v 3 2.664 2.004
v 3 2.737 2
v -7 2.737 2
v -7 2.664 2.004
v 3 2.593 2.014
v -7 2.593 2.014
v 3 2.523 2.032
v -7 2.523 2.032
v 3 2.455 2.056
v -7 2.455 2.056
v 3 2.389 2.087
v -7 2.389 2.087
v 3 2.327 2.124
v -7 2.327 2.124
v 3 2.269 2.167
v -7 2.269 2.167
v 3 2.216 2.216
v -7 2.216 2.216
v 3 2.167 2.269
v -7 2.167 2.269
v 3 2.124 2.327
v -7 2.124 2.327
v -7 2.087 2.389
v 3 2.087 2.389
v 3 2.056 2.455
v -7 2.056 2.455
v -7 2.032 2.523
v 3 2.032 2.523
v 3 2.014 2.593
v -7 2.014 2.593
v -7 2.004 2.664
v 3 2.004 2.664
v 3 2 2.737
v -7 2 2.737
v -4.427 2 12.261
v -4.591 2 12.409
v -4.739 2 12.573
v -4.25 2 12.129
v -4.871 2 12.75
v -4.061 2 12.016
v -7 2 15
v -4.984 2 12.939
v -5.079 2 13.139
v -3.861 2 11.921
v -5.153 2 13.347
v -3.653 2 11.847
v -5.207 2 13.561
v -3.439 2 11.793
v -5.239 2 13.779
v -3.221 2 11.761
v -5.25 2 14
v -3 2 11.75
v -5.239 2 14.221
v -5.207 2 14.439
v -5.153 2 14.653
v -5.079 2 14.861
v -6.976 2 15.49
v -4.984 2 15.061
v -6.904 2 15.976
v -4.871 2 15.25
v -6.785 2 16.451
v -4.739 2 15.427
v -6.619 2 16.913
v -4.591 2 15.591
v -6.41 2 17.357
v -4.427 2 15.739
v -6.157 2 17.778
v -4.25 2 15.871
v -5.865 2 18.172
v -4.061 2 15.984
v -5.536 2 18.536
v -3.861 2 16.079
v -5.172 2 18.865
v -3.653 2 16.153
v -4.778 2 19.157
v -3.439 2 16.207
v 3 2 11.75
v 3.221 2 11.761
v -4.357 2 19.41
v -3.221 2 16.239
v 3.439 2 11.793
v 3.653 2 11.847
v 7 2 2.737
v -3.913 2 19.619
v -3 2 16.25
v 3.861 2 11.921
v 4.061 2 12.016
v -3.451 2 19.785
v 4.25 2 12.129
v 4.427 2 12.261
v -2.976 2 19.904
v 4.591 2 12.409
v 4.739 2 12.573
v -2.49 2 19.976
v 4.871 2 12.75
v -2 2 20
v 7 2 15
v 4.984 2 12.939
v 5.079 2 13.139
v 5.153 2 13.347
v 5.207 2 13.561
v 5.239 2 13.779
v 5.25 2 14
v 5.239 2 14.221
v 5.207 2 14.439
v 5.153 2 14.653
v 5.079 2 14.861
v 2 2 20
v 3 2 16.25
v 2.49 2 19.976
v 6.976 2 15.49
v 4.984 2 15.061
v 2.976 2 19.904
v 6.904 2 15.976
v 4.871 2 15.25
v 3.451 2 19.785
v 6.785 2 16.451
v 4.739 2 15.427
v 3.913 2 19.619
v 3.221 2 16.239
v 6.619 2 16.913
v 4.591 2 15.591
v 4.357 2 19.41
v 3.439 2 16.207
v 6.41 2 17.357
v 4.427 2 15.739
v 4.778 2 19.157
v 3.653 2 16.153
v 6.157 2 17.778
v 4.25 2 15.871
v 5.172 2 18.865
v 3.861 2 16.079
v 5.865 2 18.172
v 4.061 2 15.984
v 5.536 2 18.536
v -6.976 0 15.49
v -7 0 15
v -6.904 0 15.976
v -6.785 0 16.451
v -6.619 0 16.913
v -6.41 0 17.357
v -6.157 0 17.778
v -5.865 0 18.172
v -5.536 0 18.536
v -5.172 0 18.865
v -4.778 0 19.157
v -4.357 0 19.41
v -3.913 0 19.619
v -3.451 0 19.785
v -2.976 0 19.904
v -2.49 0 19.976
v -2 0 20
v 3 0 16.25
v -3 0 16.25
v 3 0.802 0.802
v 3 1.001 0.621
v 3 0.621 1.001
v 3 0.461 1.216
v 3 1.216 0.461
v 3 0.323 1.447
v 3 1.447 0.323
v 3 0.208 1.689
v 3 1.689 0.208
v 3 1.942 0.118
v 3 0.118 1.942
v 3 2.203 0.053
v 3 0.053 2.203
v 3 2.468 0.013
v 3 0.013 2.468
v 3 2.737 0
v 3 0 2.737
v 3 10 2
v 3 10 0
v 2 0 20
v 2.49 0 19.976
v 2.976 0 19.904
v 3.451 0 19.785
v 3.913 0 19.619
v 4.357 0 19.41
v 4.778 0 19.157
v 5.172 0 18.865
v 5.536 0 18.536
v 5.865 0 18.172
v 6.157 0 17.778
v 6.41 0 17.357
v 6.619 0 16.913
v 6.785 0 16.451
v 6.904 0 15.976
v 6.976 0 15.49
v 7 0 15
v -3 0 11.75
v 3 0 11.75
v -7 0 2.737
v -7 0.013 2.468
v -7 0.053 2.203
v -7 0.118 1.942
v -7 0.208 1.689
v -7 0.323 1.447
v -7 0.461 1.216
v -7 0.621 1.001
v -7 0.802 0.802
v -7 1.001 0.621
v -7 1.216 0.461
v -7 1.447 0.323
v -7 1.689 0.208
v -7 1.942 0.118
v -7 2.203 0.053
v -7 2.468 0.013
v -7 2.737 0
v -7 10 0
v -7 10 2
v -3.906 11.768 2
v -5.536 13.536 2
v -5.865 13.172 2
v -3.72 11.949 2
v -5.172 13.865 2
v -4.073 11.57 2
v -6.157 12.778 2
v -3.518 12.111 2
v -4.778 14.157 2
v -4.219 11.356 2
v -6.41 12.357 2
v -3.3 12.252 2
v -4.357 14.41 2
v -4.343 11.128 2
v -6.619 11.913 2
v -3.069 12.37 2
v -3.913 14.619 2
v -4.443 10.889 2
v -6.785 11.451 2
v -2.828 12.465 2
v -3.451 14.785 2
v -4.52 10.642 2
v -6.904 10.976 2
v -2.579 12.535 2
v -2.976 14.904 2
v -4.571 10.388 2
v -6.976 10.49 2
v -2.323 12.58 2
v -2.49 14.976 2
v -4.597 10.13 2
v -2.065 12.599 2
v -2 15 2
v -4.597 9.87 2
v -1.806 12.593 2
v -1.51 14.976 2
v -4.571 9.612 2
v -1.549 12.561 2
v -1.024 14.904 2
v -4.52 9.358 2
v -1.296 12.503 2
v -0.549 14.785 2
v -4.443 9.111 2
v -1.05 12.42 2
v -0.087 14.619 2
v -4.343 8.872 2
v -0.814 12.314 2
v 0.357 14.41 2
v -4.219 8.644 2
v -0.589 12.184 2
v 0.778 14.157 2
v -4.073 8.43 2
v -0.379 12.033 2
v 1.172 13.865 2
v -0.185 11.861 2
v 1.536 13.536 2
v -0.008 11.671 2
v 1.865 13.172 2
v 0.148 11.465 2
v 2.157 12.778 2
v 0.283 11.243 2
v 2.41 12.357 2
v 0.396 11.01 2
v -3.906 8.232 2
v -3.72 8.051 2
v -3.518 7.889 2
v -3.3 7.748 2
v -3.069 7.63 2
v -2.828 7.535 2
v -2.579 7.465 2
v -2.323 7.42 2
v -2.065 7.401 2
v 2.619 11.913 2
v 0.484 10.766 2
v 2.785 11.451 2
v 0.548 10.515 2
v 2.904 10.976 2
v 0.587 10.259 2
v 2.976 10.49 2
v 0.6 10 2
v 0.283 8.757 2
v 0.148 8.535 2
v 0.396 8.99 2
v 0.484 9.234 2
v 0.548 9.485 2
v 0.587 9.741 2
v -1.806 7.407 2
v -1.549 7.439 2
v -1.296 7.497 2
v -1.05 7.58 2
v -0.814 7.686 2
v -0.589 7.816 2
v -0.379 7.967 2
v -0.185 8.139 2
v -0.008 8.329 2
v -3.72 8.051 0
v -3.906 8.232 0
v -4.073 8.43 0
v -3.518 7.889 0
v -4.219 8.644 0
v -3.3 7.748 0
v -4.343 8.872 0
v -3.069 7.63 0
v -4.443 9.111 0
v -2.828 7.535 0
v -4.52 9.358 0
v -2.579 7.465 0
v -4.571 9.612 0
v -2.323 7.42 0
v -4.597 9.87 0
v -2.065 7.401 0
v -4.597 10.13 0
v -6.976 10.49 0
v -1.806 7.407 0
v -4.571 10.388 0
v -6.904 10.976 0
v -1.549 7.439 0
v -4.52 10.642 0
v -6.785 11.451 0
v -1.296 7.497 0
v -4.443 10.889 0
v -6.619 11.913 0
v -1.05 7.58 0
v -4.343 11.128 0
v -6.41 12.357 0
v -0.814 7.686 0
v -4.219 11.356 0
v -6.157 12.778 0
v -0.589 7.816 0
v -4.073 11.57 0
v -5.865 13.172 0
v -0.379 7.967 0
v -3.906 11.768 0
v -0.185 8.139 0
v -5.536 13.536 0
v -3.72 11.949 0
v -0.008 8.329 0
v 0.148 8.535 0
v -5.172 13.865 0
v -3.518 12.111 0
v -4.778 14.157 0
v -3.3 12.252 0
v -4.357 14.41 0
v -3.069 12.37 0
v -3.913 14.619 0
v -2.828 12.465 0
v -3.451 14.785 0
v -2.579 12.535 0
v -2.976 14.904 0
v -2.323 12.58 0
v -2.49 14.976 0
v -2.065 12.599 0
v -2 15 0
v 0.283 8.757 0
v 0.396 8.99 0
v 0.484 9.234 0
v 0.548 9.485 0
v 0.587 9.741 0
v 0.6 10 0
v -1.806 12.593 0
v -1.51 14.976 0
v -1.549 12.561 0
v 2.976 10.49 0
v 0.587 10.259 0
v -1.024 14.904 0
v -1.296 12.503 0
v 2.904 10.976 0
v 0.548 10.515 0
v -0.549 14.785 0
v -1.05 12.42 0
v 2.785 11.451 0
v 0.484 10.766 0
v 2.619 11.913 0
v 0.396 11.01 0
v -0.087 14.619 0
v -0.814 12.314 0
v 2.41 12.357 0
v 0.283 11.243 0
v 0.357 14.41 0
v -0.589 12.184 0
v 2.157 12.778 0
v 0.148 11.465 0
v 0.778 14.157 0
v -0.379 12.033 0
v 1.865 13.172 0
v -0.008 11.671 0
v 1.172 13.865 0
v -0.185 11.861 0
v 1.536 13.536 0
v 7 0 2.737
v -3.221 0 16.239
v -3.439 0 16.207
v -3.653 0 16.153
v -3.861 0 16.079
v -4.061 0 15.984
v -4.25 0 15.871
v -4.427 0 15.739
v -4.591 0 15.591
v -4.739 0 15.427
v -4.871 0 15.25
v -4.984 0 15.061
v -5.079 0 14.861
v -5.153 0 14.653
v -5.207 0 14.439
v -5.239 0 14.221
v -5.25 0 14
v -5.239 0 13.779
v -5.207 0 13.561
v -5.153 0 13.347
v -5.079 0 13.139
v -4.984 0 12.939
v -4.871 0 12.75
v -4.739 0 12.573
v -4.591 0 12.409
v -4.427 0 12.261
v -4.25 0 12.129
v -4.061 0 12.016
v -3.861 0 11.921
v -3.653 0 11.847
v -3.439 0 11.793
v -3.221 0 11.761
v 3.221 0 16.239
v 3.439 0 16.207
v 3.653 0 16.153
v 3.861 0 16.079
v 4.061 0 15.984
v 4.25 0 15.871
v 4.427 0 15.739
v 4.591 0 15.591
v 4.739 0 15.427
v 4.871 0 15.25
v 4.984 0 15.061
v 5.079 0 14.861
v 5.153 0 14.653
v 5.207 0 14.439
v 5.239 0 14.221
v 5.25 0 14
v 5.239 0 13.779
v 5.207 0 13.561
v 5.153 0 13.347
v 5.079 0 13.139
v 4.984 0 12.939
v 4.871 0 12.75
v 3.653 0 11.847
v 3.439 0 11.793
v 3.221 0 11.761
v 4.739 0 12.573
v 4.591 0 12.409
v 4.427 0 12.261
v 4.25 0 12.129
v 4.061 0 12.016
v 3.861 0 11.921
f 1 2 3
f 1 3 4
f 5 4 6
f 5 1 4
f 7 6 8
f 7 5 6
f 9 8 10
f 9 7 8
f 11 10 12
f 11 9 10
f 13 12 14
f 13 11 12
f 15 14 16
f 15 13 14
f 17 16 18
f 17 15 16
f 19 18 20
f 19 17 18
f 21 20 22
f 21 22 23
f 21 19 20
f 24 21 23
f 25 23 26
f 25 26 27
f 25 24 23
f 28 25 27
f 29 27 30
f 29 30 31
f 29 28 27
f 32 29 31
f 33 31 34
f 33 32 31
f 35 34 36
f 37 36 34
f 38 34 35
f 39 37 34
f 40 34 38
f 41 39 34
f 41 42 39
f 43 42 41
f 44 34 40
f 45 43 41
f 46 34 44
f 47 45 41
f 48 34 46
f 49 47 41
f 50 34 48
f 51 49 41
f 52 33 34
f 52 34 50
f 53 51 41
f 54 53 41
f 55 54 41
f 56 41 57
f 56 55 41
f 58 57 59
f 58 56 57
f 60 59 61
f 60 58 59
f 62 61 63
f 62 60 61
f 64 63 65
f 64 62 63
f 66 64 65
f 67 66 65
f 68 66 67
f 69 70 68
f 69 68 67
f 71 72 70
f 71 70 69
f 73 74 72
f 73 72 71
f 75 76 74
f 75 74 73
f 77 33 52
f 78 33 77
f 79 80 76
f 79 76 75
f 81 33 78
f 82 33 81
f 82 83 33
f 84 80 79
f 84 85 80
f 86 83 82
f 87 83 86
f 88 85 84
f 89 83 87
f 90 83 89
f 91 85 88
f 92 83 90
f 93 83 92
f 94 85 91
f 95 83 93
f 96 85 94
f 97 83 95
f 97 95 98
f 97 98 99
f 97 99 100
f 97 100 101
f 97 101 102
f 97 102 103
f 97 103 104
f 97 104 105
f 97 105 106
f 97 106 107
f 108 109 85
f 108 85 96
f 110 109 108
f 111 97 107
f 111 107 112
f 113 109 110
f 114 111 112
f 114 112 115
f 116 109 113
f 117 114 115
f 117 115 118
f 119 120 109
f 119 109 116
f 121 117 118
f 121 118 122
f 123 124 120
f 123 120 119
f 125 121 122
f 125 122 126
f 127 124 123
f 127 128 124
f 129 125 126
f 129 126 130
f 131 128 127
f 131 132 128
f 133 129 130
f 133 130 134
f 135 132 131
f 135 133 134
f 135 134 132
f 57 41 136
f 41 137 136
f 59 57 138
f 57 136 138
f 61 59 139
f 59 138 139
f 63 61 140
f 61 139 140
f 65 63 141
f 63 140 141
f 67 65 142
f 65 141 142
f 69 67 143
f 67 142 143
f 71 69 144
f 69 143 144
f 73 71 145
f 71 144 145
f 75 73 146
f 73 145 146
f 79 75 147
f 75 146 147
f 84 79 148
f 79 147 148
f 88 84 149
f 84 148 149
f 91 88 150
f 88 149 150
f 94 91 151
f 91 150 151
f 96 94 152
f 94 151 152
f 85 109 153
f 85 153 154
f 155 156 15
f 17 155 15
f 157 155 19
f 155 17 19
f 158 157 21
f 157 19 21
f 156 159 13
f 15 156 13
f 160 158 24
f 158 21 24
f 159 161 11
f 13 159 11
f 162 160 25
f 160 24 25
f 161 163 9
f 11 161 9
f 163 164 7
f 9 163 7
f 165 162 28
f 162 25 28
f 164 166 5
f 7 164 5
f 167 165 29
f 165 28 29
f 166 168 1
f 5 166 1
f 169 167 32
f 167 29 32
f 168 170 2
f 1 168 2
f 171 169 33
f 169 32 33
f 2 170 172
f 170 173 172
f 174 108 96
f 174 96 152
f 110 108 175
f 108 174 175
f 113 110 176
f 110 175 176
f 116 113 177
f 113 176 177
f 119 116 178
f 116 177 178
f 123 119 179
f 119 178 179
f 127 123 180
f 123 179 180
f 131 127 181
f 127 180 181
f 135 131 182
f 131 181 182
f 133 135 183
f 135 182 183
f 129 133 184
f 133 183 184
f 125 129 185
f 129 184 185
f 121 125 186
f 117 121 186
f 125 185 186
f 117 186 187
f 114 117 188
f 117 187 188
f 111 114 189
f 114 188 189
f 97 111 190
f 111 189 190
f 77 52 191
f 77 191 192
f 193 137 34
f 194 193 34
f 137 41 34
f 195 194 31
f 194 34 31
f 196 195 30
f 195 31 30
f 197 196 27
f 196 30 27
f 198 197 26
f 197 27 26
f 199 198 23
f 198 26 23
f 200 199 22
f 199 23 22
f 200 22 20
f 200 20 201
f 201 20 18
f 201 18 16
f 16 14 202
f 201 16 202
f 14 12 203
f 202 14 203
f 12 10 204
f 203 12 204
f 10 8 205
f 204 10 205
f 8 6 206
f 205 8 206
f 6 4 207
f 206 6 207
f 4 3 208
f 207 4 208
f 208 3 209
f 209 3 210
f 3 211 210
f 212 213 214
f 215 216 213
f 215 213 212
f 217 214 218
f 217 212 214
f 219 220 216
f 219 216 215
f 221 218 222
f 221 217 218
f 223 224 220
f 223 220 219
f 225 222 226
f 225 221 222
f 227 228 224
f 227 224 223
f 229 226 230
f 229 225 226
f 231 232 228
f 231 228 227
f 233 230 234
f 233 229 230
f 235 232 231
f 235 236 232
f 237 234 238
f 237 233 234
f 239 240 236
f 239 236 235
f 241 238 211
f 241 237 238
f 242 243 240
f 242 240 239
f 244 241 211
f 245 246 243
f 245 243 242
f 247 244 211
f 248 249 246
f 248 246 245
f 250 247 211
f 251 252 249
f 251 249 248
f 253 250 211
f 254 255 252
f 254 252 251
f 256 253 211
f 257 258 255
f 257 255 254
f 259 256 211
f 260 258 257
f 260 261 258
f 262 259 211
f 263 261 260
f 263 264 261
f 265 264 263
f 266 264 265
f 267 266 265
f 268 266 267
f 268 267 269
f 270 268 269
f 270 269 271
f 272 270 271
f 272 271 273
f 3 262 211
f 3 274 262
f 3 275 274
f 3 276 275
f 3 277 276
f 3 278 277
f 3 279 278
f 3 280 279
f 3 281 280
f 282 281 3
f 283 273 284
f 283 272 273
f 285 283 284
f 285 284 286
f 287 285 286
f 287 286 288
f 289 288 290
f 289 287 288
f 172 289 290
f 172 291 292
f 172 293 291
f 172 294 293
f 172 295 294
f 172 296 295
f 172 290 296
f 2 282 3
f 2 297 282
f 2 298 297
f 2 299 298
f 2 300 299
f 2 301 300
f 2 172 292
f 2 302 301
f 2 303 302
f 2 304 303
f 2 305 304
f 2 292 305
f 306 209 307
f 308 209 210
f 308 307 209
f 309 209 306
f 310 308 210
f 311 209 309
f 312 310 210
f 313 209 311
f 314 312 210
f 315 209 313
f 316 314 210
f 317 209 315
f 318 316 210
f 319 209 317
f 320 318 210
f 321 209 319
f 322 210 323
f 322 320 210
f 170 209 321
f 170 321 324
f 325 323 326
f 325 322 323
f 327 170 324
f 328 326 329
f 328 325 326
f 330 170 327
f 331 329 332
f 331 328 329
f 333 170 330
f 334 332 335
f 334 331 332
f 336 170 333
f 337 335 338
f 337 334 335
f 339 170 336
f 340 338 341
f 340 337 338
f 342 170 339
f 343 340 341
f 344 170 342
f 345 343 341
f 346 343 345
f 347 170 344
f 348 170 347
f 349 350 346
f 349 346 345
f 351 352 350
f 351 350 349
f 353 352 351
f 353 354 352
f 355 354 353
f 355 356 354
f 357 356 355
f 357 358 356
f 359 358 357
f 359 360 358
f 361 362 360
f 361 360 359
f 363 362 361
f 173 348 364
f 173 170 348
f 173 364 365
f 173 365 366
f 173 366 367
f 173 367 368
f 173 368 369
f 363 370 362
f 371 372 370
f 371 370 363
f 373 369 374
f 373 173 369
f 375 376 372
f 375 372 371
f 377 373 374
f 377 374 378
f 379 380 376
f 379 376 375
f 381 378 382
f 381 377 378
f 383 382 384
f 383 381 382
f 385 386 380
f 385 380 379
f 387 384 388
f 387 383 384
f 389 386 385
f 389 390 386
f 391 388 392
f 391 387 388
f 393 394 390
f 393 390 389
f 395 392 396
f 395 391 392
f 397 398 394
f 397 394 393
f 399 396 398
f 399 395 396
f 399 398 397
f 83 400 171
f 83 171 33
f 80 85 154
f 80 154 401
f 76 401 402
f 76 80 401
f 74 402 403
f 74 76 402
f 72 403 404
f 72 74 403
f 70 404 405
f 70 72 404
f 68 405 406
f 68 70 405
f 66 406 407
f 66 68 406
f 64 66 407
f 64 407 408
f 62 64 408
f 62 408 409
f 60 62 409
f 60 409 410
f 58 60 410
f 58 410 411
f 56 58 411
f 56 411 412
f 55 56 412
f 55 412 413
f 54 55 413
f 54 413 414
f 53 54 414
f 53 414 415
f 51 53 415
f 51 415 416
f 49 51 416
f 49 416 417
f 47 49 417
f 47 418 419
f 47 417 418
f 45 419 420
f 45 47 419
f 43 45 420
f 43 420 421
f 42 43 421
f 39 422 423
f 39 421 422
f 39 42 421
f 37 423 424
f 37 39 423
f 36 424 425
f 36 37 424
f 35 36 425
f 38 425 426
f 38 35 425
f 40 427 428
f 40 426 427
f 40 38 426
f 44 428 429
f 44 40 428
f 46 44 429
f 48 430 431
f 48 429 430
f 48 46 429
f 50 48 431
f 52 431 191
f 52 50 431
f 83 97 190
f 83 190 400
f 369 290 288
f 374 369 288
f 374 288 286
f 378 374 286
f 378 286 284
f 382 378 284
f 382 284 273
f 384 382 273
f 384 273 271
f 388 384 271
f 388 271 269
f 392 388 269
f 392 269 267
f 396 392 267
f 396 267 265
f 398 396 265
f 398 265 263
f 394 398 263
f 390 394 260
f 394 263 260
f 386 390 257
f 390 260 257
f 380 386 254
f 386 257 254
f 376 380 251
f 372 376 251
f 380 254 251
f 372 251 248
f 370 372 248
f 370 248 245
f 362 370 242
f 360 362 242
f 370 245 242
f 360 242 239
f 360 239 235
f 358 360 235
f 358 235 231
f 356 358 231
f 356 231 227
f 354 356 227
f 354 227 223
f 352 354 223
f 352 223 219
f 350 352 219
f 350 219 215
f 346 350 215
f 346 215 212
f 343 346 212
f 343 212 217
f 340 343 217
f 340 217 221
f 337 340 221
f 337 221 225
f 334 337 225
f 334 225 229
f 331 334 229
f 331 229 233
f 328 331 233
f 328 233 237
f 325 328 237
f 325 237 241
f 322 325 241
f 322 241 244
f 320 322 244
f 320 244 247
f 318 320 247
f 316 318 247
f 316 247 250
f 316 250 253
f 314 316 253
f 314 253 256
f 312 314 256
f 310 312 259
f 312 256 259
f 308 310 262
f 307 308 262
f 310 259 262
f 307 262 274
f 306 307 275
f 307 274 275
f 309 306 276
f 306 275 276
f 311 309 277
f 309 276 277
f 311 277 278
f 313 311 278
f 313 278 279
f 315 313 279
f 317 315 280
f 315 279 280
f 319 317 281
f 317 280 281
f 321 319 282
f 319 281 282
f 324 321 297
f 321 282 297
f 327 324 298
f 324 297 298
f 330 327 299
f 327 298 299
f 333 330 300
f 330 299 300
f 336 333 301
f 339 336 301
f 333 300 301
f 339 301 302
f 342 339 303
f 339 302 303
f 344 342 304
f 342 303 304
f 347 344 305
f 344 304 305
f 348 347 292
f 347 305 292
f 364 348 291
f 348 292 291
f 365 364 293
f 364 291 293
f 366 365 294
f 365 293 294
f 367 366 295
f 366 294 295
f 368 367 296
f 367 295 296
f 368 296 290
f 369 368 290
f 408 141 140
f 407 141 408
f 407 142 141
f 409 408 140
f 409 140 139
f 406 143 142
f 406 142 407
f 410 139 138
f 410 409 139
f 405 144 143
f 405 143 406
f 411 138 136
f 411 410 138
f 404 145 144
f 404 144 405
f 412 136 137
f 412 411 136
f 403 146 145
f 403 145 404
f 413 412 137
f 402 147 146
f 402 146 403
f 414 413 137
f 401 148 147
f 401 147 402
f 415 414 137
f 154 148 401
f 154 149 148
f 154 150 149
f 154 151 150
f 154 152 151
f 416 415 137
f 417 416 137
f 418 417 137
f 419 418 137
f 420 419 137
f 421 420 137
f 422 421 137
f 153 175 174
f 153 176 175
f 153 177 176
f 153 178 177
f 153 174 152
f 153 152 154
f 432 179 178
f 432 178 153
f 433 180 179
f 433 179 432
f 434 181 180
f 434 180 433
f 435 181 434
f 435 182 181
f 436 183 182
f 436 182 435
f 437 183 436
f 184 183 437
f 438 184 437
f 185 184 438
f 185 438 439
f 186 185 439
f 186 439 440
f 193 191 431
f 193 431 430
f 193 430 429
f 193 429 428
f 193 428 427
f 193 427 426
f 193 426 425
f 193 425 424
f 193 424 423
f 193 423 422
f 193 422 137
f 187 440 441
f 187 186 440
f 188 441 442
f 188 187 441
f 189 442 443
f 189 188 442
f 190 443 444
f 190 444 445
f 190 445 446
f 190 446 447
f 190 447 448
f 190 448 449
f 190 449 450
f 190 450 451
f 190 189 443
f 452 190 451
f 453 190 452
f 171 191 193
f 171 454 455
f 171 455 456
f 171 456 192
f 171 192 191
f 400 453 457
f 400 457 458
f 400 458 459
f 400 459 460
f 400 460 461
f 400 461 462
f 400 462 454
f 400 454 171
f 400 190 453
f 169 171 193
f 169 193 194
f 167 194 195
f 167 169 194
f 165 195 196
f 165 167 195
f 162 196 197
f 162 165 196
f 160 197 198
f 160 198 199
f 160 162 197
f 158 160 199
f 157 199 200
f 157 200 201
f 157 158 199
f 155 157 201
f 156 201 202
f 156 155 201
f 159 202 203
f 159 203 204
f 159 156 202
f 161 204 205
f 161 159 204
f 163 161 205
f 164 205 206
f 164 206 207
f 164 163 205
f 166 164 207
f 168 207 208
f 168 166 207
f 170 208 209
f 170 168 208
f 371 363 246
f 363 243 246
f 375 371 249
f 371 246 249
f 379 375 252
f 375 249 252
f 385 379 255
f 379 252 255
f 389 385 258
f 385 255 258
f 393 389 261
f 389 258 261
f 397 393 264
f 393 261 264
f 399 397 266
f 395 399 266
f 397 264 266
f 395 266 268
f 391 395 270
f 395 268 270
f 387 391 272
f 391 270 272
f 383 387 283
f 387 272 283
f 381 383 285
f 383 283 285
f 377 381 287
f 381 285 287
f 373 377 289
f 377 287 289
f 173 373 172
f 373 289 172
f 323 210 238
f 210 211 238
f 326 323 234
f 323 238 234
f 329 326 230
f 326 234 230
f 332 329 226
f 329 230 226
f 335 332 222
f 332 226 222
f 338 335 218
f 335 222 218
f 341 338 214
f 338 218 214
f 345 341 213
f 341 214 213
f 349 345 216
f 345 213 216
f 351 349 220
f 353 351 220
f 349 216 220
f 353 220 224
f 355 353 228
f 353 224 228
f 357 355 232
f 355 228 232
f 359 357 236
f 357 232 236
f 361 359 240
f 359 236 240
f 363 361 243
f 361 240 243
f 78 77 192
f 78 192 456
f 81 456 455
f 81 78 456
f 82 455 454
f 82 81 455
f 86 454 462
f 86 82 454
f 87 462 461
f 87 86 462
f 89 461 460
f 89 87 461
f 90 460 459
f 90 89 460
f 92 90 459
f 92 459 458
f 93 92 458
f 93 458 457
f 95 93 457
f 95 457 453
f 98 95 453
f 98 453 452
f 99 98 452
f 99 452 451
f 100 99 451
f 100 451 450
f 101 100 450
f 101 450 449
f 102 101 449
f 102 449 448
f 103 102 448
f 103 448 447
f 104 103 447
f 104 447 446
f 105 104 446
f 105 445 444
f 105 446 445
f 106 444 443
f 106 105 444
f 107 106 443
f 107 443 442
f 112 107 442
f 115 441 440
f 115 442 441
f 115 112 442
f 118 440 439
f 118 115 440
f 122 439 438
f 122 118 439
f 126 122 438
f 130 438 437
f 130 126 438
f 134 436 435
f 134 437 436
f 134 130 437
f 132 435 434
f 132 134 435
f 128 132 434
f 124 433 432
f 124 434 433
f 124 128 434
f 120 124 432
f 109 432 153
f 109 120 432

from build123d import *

# Parameters (mm, degrees)
SM_BASE_FLANGE_1_DEPTH = 7
CUT_EXTRUDE_1_DEPTH    = 25.859605789
SKETCH_4_W             = 2.7366
SKETCH_4_H             = 15
CUT_EXTRUDE_2_DEPTH    = 4
FILLET_1_R             = 5
SKETCH_5_R             = 2.6
CUT_EXTRUDE_3_DEPTH    = 25.454038521


# Sheet-metal steps are written as plain solids
with BuildPart() as part:
    # Sketch 1 → 基体-法兰1 (new, symmetric)
    with BuildSketch(Plane(origin=(0, 0, 0), x_dir=(0, 0, -1), z_dir=(1, 0, 0))):
        with BuildLine():
            Line((-20, 0), (-2.7366, 0))
            ThreePointArc((-2.7366, 0), (-0.801531583, 0.801531583), (0, 2.7366))
            Line((0, 2.7366), (0, 15))
            Line((0, 15), (-2, 15))
            Line((-2, 15), (-2, 2.7366))
            ThreePointArc((-2, 2.7366), (-2.215745145, 2.215745145), (-2.7366, 2))
            Line((-2.7366, 2), (-20, 2))
            Line((-20, 2), (-20, 0))
        make_face()
    extrude(amount=SM_BASE_FLANGE_1_DEPTH, both=True)

    # 草图3 → 切除-拉伸1 (cut, through all)
    with BuildSketch(Plane(origin=(0, 2, 0), x_dir=(1, 0, 0), z_dir=(0, 1, 0))):
        with BuildLine():
            Line((-3, -11.75), (3, -11.75))
            ThreePointArc((3, -11.75), (5.25, -14), (3, -16.25))
            Line((3, -16.25), (-3, -16.25))
            ThreePointArc((-3, -16.25), (-5.25, -14), (-3, -11.75))
        make_face()
    extrude(amount=-CUT_EXTRUDE_1_DEPTH, mode=Mode.SUBTRACT)

    # 草图4 → 切除-拉伸2 (cut)
    with BuildSketch(Plane.ZY.offset(-7)):
        with Locations((1.3683, 7.5)):
            Rectangle(SKETCH_4_W, SKETCH_4_H)
    extrude(amount=CUT_EXTRUDE_2_DEPTH, mode=Mode.SUBTRACT)

    # 圆角1
    fillet_1_edges = [part.edges().sort_by_distance(p)[0] for p in [
        (-7, 1, 20),
        (7, 1, 20),
        (3, 15, 1),
        (-7, 15, 1),
    ]]
    fillet(fillet_1_edges, radius=FILLET_1_R - 0.0001)  # a hair under: the kernel refuses the full size

    # 草图5 → 切除-拉伸3 (cut, through all)
    with BuildSketch(Plane.XY.offset(2)):
        with Locations((-2, 10)):
            Circle(SKETCH_5_R)
    extrude(amount=-CUT_EXTRUDE_3_DEPTH, mode=Mode.SUBTRACT)


solid = part.part
